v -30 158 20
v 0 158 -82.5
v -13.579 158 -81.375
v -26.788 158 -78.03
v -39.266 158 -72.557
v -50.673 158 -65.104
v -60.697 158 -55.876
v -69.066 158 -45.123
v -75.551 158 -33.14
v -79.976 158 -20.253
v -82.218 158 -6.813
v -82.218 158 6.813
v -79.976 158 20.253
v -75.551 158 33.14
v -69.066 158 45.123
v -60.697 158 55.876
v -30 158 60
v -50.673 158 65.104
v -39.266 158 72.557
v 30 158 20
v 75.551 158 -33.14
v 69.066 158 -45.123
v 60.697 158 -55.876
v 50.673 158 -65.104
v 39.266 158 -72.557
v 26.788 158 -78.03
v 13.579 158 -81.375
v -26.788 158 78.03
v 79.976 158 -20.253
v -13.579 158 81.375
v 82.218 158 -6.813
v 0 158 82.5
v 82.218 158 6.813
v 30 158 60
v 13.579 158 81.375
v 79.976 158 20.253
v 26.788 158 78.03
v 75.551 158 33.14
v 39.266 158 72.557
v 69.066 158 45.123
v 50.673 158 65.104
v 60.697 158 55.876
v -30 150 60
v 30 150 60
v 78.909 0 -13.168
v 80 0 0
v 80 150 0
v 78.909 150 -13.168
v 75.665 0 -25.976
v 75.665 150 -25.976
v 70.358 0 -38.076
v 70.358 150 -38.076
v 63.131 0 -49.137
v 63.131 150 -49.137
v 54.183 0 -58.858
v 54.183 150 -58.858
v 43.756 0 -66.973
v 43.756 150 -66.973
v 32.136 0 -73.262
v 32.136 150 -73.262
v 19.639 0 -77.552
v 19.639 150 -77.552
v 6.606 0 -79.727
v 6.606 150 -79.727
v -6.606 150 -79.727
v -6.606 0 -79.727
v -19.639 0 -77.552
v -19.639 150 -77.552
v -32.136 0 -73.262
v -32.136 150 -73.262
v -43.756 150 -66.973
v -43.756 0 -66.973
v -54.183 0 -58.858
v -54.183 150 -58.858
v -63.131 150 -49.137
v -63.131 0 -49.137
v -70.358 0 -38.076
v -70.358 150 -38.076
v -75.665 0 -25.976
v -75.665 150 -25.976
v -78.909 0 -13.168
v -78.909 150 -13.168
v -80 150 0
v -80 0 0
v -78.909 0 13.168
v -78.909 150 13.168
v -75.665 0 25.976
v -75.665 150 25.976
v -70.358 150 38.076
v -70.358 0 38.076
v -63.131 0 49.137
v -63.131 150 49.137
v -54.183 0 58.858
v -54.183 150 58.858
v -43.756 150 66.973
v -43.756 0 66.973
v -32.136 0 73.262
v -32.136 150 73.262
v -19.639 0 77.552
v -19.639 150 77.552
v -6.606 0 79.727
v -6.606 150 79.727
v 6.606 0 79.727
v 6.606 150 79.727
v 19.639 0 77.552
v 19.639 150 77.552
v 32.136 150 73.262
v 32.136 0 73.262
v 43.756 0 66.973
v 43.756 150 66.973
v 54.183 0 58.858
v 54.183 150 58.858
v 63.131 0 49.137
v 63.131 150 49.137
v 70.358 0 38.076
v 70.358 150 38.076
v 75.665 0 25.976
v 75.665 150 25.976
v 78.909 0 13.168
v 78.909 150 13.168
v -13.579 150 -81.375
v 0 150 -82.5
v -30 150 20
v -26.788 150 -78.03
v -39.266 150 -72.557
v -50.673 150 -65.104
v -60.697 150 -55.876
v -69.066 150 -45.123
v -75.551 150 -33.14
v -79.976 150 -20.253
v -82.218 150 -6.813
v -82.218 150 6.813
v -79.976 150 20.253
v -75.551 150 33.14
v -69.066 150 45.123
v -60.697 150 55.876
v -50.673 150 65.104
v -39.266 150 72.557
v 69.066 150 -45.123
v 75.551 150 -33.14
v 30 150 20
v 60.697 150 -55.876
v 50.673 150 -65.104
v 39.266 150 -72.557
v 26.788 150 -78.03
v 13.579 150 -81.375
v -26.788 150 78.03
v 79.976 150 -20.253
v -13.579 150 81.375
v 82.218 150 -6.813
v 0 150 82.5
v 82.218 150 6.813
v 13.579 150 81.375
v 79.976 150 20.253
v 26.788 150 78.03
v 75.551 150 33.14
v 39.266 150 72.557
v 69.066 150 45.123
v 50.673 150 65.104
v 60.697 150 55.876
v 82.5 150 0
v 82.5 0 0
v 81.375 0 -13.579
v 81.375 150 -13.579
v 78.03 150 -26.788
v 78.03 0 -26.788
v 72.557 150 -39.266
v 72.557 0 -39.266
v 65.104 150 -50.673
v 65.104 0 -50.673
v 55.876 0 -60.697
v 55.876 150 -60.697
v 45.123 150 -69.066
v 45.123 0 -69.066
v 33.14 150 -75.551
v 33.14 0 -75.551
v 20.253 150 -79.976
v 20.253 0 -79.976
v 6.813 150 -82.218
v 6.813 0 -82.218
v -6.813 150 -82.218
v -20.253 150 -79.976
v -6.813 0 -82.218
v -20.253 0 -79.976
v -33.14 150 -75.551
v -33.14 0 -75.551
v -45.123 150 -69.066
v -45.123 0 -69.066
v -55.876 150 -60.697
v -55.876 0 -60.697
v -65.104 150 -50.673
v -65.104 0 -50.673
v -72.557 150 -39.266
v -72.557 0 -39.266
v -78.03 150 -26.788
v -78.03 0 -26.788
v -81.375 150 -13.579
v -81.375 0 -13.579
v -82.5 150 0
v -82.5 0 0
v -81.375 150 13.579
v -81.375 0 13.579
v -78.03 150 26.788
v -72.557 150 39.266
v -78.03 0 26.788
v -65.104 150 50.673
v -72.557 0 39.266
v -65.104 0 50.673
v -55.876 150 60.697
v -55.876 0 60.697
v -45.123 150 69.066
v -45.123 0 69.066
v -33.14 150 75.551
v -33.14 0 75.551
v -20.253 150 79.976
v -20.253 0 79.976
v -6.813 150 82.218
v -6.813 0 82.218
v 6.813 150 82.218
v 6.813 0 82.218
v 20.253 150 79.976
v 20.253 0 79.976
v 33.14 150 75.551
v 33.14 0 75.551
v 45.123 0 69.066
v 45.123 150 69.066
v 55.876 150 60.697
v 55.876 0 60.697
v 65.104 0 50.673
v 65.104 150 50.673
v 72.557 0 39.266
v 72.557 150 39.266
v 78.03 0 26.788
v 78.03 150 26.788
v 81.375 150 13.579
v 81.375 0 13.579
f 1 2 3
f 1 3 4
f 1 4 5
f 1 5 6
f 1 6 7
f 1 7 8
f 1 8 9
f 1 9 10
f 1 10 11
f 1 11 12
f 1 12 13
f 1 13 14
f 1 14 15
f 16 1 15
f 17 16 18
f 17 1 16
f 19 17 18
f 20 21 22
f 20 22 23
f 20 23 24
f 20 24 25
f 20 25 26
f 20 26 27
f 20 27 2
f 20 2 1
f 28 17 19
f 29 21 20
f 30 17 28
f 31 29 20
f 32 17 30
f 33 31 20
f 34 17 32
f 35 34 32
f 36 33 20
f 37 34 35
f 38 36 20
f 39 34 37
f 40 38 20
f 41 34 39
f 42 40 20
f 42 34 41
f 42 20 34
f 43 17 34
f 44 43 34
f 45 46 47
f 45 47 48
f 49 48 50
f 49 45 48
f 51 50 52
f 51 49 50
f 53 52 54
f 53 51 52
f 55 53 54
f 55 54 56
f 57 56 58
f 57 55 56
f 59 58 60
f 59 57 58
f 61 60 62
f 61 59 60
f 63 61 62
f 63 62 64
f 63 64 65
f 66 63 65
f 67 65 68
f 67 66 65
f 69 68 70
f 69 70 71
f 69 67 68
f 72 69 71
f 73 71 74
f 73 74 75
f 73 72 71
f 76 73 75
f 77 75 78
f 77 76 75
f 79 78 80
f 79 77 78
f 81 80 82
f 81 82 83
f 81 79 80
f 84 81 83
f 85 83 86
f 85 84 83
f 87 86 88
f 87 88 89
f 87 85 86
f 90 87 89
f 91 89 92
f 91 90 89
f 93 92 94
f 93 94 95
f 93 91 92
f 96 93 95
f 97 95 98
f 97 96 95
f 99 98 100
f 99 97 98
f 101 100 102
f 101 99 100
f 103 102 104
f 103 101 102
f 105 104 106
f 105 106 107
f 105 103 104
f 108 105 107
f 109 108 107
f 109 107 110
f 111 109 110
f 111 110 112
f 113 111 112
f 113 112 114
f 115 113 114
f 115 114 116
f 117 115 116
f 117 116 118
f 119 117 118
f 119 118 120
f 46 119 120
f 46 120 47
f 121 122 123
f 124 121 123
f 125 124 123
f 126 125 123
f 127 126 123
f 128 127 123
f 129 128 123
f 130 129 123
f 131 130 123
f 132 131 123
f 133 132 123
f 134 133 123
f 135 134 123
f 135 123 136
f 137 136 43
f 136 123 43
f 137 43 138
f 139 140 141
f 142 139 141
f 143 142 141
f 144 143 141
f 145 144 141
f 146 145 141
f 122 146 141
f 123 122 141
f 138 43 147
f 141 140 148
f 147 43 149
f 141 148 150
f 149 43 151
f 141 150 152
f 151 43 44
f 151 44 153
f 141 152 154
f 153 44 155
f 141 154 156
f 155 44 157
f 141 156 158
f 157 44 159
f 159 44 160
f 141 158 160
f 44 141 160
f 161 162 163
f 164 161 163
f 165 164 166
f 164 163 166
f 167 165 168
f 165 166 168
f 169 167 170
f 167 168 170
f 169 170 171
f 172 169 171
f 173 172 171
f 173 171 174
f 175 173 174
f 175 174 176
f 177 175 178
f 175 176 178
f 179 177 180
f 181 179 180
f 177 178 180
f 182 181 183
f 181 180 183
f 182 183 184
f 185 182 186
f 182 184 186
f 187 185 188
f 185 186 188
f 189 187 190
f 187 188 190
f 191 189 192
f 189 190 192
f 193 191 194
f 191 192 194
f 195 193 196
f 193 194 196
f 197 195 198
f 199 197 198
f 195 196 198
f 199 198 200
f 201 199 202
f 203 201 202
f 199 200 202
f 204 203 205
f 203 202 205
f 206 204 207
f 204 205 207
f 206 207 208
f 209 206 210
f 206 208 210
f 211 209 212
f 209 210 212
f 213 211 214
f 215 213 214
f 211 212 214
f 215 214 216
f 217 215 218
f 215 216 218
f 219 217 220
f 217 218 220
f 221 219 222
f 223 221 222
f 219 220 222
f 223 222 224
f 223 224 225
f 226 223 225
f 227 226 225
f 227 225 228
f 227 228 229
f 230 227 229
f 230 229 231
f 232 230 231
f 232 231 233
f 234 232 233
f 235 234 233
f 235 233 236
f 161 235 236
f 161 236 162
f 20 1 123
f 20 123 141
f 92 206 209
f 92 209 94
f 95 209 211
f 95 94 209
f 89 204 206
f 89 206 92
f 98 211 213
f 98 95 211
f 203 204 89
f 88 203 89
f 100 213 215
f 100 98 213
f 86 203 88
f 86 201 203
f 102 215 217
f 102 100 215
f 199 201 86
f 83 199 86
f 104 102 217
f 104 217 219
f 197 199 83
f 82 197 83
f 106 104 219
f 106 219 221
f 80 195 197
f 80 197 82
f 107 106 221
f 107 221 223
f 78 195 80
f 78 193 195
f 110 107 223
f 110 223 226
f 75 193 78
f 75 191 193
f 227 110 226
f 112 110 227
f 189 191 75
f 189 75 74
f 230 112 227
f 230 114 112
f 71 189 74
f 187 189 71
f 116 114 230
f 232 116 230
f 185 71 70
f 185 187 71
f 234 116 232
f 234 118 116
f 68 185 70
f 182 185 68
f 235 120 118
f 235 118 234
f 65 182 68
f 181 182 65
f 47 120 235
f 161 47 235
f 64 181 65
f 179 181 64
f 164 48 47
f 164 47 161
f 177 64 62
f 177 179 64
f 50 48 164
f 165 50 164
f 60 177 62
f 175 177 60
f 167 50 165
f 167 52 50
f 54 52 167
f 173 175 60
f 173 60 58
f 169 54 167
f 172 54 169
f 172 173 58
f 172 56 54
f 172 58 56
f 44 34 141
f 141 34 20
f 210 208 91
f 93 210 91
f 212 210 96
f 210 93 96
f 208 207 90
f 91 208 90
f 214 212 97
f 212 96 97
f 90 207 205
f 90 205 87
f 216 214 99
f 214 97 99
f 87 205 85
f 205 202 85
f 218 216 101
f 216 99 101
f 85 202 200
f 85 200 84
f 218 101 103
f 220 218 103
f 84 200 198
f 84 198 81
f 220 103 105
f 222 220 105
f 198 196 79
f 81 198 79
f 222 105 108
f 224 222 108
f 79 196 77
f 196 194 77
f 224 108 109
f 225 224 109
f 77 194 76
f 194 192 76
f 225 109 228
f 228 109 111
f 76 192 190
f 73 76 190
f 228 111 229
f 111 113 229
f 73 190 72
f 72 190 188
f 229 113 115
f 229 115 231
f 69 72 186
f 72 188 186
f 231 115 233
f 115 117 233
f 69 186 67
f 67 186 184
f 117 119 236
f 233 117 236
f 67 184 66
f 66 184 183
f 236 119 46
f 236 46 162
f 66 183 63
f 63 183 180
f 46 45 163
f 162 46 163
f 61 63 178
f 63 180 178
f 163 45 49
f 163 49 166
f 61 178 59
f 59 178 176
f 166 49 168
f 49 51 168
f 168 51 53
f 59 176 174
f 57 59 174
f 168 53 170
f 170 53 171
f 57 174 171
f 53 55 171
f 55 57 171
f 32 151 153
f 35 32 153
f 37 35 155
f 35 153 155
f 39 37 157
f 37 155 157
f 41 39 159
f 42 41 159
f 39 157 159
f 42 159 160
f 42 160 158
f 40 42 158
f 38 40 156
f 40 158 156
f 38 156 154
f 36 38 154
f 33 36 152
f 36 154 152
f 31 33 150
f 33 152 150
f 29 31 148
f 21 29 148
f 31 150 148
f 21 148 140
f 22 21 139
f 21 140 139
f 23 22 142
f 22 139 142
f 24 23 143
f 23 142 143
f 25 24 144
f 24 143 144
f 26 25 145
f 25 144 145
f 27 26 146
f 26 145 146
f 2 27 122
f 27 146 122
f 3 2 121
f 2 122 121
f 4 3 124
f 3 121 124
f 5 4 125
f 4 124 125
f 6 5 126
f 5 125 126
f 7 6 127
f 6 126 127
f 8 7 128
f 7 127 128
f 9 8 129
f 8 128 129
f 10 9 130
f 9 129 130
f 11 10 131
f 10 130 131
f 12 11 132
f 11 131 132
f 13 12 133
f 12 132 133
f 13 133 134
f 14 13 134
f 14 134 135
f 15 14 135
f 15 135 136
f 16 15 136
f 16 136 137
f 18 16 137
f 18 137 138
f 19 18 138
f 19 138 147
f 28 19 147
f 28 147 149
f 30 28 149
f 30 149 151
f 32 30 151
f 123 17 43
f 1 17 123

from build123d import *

# Parameters (mm, degrees)
SKETCH1_R           = 82.5
SKETCH1_R_2         = 80
EXTRUDE_THIN1_DEPTH = 150
SKETCH2_R           = 82.5
BOSS_EXTRUDE1_DEPTH = 8
SKETCH3_W           = 60
SKETCH3_H           = 40
CUT_EXTRUDE1_DEPTH  = 197.409012013


with BuildPart() as part:
    # Sketch1 → Extrude-Thin1 (new body)
    with BuildSketch(Plane(origin=(0, 0, 0), x_dir=(1, 0, 0), z_dir=(0, 1, 0))):
        Circle(SKETCH1_R)
        Circle(SKETCH1_R_2, mode=Mode.SUBTRACT)
    extrude(amount=EXTRUDE_THIN1_DEPTH)


with BuildPart() as body_2:
    # Sketch2 → Boss-Extrude1 (new body)
    with BuildSketch(Plane(origin=(0, 150, 0), x_dir=(1, 0, 0), z_dir=(0, 1, 0))):
        with Locations(Location((0, 0, 0), (0, 0, 270))):
            Circle(SKETCH2_R)
    extrude(amount=BOSS_EXTRUDE1_DEPTH)

    # Sketch3 → Cut-Extrude1 (cut, through all)
    with BuildSketch(Plane(origin=(0, 158, 0), x_dir=(1, 0, 0), z_dir=(0, 1, 0))):
        with Locations((0, -40)):
            Rectangle(SKETCH3_W, SKETCH3_H)
    extrude(amount=-CUT_EXTRUDE1_DEPTH, mode=Mode.SUBTRACT)


solid = Compound([part.part, body_2.part])
